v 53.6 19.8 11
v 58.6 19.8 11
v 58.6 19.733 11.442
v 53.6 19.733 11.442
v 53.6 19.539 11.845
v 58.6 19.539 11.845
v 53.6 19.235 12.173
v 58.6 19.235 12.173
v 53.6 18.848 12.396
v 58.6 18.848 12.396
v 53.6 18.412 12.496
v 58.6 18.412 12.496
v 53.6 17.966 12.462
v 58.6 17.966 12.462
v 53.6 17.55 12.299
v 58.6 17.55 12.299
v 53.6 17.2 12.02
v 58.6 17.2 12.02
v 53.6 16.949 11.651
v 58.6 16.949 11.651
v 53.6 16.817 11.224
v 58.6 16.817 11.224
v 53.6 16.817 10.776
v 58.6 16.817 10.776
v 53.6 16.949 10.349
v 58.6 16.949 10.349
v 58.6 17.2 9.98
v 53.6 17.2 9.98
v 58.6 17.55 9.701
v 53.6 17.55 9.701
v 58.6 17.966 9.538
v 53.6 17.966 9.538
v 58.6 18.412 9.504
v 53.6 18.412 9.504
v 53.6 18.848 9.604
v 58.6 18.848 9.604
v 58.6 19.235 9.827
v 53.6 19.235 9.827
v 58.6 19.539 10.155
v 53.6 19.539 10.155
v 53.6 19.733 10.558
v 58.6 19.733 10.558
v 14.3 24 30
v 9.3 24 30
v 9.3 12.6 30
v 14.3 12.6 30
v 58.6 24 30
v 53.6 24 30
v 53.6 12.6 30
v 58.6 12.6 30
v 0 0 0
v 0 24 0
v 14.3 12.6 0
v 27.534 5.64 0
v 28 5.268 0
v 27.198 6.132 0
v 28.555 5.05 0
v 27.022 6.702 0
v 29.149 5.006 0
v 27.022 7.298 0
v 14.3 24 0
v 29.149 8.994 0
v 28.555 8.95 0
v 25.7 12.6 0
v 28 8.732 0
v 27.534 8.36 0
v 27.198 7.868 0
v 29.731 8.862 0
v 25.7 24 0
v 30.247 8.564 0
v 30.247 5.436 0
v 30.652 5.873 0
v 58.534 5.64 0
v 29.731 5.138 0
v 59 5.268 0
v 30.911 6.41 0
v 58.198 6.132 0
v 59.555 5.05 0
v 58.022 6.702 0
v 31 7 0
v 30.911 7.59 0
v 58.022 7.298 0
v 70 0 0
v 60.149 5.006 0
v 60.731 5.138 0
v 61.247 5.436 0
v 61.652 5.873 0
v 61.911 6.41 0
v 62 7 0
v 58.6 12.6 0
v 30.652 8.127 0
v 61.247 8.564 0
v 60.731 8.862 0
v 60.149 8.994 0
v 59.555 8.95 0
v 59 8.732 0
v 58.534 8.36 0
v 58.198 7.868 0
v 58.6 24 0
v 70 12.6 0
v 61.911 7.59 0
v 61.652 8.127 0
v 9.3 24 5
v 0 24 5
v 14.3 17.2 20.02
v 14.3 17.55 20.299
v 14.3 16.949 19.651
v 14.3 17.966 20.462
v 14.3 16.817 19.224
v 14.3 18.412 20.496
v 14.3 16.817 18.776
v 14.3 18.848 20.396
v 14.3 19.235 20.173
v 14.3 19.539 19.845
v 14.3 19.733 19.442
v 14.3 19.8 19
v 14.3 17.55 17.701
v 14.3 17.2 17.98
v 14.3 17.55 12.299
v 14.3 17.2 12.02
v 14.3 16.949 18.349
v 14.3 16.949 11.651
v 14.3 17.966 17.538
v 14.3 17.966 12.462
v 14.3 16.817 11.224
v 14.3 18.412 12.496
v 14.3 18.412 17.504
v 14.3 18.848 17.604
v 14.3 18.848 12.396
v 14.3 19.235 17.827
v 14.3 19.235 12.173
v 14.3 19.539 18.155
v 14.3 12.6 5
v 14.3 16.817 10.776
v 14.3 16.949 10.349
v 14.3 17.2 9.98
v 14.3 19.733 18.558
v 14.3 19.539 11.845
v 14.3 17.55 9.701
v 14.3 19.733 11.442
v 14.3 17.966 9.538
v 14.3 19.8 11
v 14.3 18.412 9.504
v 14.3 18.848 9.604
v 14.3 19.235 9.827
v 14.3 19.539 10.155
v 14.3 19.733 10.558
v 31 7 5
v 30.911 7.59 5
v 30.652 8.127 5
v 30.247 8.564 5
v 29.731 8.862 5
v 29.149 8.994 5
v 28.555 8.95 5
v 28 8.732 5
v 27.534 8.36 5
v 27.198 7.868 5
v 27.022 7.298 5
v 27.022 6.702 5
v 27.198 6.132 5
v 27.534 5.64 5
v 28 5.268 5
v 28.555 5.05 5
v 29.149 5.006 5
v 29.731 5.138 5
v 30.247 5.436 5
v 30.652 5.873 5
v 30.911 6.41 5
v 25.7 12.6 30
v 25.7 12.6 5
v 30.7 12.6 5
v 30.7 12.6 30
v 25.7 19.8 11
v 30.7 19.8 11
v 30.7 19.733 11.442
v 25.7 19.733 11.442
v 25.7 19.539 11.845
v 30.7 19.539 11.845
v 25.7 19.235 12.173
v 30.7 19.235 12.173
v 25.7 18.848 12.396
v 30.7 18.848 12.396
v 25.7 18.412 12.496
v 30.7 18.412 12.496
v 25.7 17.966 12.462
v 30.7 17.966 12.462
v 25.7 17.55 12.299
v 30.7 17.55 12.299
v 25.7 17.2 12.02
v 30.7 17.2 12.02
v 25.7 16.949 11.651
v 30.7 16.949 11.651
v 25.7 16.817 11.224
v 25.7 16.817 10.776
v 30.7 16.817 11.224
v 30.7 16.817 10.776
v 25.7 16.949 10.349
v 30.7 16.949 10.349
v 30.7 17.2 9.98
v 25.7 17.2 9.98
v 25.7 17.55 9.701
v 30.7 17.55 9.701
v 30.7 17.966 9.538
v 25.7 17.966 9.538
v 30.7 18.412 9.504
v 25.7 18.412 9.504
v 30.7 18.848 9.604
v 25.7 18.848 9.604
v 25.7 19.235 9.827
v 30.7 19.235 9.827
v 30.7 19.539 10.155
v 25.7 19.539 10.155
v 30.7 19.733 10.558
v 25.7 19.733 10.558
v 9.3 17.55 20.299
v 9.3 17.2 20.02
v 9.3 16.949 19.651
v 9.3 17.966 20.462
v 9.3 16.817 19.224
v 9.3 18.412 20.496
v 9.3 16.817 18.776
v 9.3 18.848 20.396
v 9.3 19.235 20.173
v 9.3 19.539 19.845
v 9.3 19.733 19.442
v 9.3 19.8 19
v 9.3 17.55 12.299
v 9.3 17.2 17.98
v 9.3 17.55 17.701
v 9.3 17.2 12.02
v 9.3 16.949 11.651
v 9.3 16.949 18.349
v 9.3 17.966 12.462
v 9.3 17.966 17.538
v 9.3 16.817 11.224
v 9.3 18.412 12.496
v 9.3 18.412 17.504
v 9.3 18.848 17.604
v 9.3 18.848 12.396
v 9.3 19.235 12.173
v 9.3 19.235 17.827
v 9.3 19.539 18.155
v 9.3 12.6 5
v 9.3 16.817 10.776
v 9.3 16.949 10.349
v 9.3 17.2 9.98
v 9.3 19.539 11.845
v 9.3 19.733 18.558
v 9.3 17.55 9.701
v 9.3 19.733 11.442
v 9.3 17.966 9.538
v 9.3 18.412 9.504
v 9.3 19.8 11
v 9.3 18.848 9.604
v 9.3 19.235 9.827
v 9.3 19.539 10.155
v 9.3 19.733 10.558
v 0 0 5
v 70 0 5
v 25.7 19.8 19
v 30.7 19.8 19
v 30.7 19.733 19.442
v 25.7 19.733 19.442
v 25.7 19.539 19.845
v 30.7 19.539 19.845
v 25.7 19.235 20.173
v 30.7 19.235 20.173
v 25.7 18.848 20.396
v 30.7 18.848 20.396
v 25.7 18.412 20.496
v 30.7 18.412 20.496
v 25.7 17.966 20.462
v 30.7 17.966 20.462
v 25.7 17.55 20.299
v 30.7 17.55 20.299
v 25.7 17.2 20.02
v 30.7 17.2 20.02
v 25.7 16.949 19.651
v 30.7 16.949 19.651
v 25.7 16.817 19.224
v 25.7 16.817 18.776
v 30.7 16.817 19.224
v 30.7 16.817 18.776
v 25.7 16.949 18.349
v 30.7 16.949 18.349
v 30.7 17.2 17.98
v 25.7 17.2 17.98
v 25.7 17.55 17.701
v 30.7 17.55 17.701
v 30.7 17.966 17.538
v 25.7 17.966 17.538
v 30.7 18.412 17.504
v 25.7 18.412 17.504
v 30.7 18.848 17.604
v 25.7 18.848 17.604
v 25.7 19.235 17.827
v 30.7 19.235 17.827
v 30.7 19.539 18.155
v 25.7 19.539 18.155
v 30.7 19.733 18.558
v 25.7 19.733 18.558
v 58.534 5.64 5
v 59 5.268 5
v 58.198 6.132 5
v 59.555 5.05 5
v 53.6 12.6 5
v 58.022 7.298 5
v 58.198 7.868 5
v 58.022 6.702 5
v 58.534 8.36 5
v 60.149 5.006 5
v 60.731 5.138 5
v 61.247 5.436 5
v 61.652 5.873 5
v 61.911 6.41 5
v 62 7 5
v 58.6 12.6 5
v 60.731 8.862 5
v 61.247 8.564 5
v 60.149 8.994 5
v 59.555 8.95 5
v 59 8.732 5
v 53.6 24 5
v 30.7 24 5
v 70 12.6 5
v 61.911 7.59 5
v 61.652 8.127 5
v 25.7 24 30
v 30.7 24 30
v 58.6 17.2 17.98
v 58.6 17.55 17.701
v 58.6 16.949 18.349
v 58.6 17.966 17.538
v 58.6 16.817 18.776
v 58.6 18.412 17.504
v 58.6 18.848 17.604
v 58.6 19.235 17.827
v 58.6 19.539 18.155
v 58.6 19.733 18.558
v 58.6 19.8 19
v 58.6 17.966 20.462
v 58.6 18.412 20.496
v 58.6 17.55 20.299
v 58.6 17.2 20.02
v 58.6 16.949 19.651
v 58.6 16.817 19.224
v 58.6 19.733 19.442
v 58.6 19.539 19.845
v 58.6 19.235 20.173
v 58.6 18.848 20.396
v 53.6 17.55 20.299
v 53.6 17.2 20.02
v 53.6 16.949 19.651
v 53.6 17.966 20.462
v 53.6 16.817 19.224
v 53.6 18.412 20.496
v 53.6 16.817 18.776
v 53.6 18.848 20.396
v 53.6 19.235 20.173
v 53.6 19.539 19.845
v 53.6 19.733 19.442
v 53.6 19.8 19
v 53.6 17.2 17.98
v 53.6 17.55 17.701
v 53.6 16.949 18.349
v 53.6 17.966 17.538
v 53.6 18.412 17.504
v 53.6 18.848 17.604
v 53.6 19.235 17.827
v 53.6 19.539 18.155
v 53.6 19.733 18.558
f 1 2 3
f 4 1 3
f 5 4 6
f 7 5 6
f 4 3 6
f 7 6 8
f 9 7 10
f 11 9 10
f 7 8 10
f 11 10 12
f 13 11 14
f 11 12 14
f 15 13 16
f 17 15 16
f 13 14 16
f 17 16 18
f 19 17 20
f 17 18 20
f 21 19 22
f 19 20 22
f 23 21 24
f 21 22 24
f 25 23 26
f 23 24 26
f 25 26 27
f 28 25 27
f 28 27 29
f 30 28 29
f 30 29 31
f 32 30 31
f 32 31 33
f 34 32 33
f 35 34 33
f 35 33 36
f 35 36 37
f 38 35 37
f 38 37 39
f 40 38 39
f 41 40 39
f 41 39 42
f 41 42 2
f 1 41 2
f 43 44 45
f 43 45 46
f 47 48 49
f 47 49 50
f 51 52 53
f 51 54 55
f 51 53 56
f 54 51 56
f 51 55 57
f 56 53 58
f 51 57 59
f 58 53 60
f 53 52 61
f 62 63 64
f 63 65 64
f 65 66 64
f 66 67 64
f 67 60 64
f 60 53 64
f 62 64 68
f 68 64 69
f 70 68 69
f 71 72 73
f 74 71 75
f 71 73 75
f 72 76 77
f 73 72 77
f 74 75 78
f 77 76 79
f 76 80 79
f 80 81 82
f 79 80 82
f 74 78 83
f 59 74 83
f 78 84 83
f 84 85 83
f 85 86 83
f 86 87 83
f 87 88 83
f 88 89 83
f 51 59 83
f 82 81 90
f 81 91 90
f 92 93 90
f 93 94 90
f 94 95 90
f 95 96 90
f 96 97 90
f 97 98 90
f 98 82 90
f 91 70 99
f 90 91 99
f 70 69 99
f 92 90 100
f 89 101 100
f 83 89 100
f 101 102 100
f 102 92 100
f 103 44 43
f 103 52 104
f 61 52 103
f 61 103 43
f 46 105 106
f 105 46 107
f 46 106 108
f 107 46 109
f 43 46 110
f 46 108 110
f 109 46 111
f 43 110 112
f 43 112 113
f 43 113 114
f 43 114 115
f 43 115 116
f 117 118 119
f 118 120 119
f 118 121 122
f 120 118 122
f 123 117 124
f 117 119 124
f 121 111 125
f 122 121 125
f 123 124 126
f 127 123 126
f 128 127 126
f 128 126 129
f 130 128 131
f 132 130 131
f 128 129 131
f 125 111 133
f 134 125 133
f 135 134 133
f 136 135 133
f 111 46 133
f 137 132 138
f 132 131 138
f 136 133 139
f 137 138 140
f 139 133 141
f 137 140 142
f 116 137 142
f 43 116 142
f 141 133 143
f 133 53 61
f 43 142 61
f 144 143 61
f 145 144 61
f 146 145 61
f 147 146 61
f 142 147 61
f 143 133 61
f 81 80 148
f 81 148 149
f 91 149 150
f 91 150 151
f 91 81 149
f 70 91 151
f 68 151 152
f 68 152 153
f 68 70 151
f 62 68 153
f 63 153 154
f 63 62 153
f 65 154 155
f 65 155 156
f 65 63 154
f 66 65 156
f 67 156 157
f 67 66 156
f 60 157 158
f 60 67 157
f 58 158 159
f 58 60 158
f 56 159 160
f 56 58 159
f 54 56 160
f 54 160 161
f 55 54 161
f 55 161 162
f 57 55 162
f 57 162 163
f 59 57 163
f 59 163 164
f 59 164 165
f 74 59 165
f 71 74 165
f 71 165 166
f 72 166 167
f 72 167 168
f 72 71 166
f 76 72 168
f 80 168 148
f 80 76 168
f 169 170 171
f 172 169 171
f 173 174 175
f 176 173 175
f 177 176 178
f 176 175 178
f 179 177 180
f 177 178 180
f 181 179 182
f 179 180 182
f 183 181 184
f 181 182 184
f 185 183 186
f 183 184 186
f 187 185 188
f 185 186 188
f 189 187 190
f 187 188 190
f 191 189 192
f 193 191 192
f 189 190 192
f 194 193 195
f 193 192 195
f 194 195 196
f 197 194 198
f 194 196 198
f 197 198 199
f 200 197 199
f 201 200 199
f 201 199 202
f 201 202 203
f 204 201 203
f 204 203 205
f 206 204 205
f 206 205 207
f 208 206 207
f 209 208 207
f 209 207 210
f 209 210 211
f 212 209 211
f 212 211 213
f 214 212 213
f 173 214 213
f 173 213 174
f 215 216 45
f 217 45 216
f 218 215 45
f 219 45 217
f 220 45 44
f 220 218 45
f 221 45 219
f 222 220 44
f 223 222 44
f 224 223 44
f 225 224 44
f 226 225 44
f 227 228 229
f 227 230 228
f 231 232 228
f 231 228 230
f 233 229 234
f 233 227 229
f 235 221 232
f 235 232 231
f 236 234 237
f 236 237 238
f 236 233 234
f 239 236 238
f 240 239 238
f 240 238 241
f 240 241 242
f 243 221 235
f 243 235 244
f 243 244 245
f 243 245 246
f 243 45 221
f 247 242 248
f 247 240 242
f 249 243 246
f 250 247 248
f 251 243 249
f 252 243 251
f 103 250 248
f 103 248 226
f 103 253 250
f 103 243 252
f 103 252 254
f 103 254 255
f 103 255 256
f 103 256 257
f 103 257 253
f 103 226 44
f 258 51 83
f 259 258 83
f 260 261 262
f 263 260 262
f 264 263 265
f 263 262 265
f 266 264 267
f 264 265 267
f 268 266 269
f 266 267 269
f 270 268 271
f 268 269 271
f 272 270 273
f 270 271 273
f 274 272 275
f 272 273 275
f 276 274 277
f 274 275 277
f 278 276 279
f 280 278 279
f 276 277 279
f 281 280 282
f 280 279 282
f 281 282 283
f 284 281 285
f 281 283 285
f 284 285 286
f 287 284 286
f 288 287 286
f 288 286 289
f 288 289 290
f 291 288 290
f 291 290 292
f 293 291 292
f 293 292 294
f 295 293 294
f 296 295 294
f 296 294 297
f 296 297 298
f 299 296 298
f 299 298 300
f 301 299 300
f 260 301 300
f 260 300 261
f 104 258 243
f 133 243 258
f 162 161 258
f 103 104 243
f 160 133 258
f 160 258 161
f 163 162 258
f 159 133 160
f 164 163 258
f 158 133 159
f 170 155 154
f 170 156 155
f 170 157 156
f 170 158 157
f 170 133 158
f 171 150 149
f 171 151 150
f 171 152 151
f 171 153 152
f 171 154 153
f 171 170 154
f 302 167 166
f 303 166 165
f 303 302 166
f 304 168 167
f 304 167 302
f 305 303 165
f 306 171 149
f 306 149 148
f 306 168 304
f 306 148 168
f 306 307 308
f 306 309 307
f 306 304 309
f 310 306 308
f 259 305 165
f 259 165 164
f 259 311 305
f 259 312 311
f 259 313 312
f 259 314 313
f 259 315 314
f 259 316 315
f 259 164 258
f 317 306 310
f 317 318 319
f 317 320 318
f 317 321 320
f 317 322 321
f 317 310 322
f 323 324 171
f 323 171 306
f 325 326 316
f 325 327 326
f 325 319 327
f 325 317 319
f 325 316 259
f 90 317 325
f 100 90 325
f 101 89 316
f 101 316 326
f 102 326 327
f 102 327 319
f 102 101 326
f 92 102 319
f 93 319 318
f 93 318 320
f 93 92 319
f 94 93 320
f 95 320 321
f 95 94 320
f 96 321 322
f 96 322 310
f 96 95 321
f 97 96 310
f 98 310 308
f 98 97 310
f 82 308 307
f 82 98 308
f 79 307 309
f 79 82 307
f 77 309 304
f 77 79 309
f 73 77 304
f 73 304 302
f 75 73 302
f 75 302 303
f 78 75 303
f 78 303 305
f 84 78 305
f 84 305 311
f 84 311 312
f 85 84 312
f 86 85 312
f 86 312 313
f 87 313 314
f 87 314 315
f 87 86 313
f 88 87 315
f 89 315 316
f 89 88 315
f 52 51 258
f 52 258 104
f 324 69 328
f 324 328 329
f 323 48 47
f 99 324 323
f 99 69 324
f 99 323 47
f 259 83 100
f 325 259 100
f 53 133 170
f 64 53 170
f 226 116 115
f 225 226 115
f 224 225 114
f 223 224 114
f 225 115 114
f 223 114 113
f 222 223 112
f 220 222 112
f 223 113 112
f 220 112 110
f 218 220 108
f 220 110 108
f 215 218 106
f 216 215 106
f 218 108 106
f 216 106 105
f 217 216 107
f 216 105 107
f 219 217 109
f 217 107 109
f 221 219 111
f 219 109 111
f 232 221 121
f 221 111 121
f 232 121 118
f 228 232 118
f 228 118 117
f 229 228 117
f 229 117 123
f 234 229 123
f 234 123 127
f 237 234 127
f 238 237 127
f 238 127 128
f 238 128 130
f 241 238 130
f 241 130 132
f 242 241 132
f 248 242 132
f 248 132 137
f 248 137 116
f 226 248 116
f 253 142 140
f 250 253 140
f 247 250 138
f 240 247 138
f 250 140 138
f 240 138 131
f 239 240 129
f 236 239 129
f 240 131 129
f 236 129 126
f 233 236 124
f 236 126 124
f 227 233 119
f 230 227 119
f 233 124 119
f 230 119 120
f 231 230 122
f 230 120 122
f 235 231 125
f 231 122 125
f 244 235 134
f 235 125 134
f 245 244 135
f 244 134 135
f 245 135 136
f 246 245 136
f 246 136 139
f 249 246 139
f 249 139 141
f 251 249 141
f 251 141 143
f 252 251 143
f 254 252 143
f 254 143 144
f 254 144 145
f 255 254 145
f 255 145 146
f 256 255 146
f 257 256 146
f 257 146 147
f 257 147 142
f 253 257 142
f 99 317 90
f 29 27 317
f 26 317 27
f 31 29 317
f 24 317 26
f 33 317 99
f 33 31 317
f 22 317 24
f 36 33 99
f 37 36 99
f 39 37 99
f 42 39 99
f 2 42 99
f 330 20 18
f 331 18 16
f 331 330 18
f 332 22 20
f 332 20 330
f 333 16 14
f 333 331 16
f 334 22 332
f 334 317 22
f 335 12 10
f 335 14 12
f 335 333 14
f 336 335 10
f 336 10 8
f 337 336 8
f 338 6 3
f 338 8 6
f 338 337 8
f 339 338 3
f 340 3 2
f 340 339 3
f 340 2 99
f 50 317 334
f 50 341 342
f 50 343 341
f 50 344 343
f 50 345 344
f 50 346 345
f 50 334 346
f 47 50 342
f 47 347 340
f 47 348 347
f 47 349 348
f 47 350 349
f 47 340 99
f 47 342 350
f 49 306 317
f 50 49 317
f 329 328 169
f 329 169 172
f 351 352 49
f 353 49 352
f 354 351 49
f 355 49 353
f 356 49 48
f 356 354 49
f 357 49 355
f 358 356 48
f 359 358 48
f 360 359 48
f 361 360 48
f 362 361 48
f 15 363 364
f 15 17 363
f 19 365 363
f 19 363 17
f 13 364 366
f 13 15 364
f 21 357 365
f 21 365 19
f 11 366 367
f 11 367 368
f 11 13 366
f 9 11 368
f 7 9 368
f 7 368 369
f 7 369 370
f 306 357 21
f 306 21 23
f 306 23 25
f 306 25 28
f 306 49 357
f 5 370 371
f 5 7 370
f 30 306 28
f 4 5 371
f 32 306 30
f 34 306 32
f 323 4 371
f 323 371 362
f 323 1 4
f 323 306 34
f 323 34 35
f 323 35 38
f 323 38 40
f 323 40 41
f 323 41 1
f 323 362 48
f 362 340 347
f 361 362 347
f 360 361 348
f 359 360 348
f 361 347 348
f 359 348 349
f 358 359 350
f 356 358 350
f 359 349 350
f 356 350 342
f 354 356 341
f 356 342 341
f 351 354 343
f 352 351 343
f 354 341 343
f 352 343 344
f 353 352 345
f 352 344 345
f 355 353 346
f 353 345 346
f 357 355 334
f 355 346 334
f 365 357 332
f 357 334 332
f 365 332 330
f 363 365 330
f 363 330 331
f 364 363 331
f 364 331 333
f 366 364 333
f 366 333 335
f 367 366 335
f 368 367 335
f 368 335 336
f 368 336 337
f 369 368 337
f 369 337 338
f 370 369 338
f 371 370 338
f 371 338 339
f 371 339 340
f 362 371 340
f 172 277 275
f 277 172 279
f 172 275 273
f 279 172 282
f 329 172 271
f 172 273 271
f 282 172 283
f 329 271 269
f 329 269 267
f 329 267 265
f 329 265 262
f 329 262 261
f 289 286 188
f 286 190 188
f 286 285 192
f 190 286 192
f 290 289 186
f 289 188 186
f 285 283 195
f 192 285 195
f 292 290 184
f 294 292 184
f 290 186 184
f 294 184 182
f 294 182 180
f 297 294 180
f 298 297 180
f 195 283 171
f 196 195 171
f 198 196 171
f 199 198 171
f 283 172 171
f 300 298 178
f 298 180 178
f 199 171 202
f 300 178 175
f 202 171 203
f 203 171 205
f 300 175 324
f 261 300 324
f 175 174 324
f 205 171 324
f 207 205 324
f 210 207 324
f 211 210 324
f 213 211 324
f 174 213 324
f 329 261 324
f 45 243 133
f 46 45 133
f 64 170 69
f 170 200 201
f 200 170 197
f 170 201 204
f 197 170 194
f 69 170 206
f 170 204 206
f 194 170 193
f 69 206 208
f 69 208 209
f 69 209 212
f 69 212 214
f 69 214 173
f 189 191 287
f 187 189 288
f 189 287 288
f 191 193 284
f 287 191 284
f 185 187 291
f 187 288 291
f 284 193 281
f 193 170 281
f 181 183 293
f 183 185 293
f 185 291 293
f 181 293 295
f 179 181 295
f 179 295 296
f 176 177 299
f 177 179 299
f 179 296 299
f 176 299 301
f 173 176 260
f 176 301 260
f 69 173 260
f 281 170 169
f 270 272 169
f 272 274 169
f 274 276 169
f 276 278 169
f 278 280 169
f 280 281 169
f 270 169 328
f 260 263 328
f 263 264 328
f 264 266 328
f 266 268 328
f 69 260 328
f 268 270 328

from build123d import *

# Parameters (mm, degrees)
SKETCH_W        = 70
SKETCH_H        = 24
SKETCH_R        = 2
PAD_DEPTH       = 5
SKETCH001_W     = 11.4
SKETCH001_H     = 11.4
POCKET_DEPTH    = 5.001
SKETCH002_W     = 5
SKETCH002_H     = 11.4
PAD001_DEPTH    = 25
SKETCH003_R     = 1.5
POCKET001_DEPTH = 58.601


with BuildPart() as part:
    # Sketch → Pad (new body)
    with BuildSketch(Plane.XY):
        with Locations((35, 12)):
            Rectangle(SKETCH_W, SKETCH_H)
        with Locations((60, 7)):
            Circle(SKETCH_R, mode=Mode.SUBTRACT)
        with Locations((29, 7)):
            Circle(SKETCH_R, mode=Mode.SUBTRACT)
    extrude(amount=PAD_DEPTH)

    # Sketch001 → Pocket (cut, through all)
    with BuildSketch(Plane.XY.offset(5)):
        with Locations((64.3, 18.3)):
            Rectangle(SKETCH001_W, SKETCH001_H)
        with Locations((20, 18.3)):
            Rectangle(SKETCH001_W, SKETCH001_H)
    extrude(amount=-POCKET_DEPTH, mode=Mode.SUBTRACT)

    # Sketch002 → Pad001 (new body)
    with BuildSketch(Plane.XY.offset(5)):
        with Locations((11.8, 18.3)):
            Rectangle(SKETCH002_W, SKETCH002_H)
        with Locations((28.2, 18.3)):
            Rectangle(SKETCH002_W, SKETCH002_H)
        with Locations((56.1, 18.3)):
            Rectangle(SKETCH002_W, SKETCH002_H)
    extrude(amount=PAD001_DEPTH)

    # Sketch003 → Pocket001 (cut, through all)
    with BuildSketch(Plane.YZ.offset(58.6)):
        with Locations((18.3, 19)):
            Circle(SKETCH003_R)
        with Locations((18.3, 11)):
            Circle(SKETCH003_R)
    extrude(amount=-POCKET001_DEPTH, mode=Mode.SUBTRACT)


solid = part.part
